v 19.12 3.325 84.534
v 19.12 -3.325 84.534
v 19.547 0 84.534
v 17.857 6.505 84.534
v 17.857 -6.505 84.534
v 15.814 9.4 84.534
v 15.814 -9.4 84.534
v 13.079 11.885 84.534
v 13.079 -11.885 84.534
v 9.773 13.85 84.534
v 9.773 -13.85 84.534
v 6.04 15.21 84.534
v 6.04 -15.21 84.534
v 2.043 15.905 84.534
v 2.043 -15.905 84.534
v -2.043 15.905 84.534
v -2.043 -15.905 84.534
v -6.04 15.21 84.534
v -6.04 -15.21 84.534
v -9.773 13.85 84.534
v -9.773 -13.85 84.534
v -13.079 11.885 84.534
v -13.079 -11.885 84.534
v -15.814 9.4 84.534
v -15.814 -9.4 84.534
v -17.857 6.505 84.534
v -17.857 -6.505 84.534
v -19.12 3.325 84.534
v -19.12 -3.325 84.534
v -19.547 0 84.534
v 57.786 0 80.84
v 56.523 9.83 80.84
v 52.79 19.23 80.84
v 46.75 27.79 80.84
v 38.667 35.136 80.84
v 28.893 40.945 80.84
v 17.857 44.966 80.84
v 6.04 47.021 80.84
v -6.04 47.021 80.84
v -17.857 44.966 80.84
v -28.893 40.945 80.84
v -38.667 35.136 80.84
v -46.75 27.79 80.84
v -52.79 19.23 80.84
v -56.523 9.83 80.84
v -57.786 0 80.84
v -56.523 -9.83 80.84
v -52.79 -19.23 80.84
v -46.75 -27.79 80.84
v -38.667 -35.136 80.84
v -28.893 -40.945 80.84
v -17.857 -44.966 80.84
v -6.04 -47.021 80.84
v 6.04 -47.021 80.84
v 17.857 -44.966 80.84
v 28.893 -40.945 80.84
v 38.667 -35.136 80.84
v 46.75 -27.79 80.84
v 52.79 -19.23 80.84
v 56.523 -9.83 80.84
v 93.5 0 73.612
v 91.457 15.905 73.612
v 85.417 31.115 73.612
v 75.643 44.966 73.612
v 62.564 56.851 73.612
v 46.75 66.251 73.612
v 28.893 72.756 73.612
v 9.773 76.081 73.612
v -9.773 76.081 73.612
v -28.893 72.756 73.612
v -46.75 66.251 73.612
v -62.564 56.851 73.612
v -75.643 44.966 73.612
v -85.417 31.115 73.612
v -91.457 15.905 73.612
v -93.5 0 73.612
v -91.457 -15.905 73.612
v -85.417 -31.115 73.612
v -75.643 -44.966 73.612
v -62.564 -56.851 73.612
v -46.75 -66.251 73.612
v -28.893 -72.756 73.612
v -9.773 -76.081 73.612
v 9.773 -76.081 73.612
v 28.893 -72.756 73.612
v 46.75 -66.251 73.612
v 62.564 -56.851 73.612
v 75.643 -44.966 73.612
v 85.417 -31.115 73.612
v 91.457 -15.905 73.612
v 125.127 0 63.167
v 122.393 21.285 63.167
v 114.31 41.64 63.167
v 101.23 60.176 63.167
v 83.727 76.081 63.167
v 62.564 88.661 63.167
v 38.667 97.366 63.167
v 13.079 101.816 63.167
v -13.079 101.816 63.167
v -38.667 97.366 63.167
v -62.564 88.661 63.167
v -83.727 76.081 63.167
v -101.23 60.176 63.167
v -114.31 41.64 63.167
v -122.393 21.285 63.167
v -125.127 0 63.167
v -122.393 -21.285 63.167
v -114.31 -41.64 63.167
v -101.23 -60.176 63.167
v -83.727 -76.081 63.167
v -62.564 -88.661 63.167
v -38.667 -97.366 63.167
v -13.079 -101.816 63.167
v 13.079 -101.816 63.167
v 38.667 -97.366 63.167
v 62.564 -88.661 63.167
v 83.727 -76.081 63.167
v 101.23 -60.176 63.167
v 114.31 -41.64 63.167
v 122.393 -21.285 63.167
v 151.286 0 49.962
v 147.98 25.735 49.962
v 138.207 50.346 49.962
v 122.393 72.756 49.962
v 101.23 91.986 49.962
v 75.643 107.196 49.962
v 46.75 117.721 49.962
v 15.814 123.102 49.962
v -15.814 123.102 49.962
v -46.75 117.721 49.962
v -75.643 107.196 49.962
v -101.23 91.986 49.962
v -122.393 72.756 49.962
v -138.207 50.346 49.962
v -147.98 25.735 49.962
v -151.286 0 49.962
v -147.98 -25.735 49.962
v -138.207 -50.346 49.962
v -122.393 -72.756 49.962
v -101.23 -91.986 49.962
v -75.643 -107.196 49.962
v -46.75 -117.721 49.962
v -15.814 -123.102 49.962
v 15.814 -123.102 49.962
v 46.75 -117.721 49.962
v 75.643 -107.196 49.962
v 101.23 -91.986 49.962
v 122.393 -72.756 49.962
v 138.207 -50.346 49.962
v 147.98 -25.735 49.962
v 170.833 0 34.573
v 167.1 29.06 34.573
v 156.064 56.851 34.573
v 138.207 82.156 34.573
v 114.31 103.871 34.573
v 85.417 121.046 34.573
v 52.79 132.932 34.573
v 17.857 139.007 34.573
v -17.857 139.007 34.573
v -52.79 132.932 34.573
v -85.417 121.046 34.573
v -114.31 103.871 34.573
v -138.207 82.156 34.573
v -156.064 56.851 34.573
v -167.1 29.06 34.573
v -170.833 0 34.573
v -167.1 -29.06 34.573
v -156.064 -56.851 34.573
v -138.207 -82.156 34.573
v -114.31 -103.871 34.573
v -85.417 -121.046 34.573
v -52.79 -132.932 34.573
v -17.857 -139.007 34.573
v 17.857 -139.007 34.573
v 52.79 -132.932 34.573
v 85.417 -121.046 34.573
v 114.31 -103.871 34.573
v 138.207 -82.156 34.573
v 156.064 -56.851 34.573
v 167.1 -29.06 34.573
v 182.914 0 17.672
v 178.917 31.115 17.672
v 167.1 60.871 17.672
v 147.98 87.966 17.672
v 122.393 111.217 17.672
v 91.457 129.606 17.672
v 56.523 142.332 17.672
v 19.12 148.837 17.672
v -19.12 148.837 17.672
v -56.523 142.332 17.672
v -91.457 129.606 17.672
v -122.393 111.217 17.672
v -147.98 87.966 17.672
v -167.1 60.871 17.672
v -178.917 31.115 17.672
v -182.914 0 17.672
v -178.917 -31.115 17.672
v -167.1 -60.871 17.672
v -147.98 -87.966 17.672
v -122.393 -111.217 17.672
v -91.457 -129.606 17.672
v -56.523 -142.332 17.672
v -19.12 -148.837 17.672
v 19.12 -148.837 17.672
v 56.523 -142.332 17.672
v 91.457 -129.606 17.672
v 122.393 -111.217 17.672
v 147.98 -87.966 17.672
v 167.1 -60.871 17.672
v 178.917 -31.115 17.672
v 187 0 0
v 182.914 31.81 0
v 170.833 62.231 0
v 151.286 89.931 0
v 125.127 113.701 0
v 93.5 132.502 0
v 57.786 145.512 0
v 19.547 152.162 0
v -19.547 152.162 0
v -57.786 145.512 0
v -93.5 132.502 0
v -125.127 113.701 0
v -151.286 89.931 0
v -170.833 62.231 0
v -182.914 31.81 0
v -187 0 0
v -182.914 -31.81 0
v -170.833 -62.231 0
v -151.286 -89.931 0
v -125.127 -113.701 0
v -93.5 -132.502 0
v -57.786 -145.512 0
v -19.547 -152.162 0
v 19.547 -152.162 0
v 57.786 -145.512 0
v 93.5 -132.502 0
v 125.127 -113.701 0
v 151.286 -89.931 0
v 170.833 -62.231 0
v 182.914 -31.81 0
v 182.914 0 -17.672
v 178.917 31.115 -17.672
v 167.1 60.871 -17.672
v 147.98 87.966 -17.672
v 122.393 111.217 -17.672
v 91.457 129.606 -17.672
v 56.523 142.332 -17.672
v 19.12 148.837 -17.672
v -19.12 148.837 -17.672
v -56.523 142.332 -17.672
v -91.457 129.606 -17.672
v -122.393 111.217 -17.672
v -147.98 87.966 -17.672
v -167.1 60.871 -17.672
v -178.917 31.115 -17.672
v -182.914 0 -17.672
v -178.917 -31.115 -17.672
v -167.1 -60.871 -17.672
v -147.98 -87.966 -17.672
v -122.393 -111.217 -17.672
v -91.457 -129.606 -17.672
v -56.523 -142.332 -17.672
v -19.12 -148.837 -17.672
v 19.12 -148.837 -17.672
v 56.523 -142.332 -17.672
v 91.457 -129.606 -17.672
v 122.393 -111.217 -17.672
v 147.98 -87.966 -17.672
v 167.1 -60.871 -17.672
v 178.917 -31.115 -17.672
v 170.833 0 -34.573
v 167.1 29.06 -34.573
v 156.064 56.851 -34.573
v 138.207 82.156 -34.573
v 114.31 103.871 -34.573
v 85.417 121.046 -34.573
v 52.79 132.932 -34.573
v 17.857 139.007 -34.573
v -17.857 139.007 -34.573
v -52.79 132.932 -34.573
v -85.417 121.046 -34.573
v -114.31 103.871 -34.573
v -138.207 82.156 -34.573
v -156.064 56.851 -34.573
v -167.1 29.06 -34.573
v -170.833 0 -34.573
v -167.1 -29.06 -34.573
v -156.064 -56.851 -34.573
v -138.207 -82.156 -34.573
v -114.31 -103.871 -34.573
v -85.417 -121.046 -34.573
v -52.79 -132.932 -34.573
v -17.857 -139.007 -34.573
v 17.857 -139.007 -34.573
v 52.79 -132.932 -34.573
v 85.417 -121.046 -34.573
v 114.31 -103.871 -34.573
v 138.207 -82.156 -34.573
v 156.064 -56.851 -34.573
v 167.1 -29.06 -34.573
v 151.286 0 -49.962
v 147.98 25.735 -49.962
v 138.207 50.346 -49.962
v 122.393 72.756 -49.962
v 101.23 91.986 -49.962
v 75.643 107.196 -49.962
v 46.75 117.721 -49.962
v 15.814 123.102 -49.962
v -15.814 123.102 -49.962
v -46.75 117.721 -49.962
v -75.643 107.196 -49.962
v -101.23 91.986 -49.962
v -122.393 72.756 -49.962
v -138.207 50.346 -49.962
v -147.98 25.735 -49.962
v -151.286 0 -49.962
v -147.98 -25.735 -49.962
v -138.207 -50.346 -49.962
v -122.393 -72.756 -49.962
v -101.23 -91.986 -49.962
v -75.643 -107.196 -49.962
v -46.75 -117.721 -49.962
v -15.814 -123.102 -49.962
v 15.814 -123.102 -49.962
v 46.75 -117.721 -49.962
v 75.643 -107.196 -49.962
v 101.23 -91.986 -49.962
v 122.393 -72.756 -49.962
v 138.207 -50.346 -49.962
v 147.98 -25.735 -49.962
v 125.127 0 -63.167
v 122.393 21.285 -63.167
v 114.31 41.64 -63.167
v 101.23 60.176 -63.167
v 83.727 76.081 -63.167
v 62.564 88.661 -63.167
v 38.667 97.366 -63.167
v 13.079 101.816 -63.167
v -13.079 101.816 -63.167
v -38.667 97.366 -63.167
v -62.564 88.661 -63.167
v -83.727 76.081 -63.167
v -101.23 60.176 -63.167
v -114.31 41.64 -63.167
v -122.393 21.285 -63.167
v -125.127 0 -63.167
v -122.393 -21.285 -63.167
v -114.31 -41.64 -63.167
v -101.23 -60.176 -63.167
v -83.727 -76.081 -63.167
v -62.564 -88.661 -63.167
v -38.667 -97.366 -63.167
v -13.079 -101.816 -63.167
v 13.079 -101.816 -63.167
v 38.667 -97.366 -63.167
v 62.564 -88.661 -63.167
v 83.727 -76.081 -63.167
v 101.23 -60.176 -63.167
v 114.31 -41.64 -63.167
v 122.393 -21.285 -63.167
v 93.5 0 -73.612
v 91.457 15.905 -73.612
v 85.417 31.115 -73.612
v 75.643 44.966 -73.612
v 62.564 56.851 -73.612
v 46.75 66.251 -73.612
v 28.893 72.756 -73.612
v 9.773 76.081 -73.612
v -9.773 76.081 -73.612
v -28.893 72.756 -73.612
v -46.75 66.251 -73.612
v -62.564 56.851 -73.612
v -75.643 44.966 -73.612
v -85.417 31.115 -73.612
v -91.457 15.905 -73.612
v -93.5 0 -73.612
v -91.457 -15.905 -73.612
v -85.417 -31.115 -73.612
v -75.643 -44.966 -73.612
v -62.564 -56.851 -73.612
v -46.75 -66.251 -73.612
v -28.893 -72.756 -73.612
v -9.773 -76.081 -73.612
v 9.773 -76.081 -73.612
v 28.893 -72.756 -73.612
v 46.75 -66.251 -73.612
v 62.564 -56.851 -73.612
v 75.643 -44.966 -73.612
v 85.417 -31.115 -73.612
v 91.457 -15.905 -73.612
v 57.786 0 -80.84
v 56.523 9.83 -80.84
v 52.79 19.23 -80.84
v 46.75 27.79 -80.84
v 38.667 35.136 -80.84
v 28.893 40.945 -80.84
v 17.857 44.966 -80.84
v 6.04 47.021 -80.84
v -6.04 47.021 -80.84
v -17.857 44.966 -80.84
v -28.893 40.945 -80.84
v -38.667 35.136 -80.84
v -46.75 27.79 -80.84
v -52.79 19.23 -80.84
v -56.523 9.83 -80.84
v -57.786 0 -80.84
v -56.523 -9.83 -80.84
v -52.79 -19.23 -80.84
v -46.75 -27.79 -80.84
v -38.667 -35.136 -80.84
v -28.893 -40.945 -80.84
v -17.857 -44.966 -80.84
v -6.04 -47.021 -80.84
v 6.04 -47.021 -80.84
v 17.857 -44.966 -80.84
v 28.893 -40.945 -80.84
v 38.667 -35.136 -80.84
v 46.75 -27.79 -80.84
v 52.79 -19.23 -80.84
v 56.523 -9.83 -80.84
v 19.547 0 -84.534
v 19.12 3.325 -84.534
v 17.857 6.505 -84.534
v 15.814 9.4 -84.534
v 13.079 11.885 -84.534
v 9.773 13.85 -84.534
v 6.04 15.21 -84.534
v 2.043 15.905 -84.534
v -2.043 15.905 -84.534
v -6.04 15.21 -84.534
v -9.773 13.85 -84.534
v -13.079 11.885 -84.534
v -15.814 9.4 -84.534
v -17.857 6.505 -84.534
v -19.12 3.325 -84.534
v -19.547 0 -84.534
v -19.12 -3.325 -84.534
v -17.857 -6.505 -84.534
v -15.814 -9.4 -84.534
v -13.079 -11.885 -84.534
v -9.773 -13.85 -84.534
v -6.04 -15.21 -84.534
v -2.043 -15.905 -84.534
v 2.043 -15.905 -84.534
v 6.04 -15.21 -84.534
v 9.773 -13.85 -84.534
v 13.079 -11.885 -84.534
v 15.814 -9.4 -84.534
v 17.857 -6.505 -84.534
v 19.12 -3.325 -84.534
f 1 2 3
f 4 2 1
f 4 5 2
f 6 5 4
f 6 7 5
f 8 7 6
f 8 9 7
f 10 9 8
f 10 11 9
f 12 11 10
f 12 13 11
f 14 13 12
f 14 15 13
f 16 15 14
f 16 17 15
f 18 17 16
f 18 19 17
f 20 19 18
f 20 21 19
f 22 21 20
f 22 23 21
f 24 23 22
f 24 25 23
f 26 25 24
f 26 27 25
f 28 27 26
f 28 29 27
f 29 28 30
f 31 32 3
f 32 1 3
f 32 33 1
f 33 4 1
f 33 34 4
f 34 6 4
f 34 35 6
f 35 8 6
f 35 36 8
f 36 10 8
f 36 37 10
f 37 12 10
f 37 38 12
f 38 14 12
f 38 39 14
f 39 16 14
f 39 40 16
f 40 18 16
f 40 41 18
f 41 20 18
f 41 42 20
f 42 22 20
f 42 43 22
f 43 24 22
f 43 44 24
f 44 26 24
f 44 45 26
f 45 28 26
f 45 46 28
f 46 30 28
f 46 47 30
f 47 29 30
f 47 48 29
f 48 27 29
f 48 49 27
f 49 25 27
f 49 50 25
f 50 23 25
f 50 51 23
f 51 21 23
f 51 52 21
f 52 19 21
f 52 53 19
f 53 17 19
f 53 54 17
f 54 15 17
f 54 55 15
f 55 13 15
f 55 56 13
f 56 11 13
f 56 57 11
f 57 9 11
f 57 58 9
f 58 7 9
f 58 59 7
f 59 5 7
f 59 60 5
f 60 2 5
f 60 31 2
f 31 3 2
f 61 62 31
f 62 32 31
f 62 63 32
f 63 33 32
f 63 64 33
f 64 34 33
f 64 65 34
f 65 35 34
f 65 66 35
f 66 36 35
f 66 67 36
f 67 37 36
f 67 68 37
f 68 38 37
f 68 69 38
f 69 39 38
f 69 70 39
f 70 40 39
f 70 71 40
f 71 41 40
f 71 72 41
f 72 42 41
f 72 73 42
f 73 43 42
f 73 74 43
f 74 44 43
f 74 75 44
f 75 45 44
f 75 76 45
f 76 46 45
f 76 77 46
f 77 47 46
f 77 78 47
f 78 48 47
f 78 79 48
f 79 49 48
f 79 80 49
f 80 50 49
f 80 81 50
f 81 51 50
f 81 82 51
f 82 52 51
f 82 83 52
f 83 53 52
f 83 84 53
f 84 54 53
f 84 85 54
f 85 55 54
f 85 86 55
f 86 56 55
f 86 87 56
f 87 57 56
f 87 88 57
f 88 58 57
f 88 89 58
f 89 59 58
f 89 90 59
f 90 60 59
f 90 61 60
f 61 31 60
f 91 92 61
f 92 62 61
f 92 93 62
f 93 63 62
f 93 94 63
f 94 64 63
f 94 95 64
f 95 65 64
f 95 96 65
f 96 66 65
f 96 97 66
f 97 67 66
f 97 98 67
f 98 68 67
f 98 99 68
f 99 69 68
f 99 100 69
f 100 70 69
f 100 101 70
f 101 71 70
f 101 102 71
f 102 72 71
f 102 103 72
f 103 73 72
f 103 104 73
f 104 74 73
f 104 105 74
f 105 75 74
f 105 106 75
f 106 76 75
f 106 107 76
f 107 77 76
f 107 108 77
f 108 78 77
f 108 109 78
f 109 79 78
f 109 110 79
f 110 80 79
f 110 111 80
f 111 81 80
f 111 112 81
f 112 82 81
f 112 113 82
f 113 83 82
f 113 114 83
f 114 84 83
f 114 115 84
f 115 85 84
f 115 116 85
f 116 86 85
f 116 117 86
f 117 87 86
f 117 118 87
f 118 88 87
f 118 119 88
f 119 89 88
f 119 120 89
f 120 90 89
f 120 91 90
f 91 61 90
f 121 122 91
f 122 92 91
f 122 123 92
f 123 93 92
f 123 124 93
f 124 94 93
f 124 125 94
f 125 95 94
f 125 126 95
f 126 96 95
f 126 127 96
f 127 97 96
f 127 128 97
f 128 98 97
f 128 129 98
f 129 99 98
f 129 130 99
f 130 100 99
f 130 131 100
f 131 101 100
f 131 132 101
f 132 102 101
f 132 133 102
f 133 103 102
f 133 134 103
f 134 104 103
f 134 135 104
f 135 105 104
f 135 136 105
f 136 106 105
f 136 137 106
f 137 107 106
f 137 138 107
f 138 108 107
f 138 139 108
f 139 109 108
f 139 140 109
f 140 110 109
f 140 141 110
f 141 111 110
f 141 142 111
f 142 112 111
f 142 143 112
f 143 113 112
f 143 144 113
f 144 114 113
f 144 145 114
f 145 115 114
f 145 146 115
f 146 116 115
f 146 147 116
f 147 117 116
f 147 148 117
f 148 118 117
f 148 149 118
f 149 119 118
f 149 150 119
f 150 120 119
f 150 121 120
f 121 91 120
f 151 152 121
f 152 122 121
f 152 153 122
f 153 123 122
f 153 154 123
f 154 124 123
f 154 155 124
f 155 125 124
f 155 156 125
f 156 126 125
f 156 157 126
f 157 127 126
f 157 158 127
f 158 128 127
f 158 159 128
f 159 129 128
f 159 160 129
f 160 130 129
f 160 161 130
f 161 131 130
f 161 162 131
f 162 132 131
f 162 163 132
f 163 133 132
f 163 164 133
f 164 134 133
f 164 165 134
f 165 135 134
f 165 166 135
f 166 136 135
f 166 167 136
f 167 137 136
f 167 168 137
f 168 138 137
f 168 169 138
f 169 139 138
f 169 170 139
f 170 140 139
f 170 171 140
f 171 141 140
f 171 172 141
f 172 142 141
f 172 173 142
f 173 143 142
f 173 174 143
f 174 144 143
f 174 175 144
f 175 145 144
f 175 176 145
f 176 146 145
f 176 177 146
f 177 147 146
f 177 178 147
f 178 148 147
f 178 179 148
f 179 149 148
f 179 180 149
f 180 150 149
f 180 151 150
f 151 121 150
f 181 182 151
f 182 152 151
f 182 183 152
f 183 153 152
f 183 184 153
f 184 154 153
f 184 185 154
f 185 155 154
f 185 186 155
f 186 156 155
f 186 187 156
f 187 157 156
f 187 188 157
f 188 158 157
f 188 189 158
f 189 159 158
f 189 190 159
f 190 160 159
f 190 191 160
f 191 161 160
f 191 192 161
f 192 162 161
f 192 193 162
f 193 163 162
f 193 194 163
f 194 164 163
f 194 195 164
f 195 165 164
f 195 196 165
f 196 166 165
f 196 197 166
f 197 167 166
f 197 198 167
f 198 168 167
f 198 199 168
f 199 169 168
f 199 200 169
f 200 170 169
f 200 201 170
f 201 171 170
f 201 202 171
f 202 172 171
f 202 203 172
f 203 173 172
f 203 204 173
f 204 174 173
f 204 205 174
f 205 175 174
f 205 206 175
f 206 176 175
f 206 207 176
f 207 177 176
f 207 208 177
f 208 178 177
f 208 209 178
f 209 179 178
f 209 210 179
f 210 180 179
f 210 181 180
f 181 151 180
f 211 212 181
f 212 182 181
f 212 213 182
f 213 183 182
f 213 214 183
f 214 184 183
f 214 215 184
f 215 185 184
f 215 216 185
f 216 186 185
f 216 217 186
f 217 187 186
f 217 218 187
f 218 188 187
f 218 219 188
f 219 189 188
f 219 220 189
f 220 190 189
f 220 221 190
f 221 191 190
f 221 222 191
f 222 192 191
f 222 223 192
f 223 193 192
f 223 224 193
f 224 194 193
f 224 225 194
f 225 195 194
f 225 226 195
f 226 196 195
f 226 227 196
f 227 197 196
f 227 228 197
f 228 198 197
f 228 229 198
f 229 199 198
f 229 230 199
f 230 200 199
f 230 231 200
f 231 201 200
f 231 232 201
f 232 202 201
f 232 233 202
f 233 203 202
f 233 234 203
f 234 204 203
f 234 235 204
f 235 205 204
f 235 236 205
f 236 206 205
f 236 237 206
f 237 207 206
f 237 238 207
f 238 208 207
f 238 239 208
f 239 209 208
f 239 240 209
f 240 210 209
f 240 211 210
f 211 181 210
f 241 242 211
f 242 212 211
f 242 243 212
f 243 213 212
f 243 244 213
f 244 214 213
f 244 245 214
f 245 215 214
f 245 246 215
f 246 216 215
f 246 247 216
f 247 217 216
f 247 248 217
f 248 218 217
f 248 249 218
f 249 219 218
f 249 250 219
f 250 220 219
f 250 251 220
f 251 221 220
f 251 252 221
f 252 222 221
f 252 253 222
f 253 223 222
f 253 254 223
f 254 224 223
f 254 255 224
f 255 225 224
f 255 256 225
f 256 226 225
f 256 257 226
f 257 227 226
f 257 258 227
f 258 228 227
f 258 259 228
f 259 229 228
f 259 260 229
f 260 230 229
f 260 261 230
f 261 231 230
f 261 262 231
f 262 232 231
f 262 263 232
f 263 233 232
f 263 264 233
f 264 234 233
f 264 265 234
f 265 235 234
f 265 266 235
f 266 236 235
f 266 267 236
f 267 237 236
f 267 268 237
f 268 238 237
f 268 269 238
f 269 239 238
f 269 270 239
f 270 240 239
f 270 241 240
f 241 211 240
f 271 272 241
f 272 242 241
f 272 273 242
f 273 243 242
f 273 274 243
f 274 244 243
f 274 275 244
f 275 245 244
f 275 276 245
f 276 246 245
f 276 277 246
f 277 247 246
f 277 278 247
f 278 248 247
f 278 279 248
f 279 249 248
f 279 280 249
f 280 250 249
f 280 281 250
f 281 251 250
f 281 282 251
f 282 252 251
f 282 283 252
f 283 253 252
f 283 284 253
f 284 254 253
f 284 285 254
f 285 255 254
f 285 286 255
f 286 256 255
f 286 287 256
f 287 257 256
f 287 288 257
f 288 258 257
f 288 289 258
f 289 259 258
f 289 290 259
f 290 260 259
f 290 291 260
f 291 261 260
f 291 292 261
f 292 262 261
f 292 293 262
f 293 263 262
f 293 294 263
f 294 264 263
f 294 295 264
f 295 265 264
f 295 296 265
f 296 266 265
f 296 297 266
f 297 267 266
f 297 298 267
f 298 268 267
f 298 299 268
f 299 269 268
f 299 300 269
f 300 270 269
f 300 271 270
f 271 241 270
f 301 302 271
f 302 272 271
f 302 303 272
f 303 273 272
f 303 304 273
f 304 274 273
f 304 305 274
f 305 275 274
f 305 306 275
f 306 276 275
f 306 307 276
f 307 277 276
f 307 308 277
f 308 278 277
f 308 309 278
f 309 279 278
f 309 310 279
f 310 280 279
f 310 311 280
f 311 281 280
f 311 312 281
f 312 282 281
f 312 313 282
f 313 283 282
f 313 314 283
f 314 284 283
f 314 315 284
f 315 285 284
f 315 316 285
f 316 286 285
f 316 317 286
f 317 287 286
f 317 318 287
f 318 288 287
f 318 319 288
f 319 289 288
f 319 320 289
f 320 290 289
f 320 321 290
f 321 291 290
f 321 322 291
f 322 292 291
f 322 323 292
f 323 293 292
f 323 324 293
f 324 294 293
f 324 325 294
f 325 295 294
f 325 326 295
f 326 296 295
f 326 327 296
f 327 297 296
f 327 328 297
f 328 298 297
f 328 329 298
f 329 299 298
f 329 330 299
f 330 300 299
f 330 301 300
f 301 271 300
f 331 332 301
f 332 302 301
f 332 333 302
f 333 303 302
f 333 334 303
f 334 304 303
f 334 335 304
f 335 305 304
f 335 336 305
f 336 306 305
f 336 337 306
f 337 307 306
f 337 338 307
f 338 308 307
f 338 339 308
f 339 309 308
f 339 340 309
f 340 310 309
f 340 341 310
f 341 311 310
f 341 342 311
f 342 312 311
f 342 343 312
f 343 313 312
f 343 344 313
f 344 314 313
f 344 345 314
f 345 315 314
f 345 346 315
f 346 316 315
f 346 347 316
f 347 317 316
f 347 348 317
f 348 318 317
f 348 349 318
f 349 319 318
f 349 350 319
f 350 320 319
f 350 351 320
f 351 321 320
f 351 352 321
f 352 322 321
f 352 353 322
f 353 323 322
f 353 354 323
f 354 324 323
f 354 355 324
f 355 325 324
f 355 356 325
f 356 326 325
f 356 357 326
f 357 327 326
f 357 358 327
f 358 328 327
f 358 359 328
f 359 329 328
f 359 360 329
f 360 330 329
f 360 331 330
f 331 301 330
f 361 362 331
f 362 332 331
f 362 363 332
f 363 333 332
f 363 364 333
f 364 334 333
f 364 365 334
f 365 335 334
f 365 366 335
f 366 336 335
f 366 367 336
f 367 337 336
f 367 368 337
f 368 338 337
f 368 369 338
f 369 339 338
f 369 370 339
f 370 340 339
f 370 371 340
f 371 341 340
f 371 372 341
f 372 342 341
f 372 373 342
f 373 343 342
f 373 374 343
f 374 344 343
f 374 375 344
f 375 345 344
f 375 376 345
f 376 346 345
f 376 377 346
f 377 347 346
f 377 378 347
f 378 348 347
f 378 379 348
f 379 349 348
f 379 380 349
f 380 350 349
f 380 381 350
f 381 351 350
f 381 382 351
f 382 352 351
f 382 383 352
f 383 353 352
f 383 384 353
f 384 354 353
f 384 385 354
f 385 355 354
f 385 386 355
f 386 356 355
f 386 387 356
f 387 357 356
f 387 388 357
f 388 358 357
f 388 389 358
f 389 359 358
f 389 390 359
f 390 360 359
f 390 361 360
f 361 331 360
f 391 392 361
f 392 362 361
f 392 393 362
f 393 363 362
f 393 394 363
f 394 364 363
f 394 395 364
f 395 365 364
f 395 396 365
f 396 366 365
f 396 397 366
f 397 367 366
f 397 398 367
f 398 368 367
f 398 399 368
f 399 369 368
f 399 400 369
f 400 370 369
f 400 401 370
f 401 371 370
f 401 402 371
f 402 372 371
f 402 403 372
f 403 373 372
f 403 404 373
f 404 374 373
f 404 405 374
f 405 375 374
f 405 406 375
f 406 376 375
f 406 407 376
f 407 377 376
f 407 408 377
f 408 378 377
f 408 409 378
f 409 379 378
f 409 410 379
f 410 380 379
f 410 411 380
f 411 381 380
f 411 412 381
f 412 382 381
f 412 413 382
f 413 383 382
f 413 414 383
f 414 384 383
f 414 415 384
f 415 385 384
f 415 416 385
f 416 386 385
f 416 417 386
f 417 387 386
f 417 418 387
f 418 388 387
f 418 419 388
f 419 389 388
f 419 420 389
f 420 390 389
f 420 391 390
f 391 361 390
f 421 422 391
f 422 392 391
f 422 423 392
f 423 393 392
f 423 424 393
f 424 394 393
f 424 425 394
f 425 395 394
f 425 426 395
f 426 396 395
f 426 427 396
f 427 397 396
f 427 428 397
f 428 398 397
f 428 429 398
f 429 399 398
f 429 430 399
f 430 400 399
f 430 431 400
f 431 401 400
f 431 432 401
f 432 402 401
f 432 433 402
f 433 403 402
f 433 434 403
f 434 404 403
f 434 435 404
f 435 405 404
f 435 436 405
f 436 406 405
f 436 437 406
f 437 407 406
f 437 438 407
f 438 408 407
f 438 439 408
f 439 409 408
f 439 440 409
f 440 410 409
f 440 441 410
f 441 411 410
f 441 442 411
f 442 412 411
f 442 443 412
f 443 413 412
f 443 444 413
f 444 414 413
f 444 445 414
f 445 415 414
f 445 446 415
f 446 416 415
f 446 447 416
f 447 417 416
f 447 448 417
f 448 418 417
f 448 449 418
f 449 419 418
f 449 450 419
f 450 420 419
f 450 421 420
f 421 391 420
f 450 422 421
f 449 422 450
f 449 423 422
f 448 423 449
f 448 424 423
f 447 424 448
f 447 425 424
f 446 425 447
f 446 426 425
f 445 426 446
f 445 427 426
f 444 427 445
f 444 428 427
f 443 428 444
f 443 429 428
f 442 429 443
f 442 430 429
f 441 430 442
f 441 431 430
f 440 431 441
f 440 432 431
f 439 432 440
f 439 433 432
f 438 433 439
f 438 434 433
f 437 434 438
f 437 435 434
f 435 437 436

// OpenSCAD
// Generated by SolidPython 1.0.1 on 2020-07-29 00:46:49


scale(v = [11, 9, 5]) {
	sphere(r = 17);
}
/***********************************************
*********      SolidPython code:      **********
************************************************
 
# import packages: SolidPython
from solid import *
from solid.utils import *
from itertools import chain, combinations, permutations


class Resize:

    def __init__(self, scad_file):
        self.scad_file = scad_file
        #self.scad_file = import_scad(scad_file)
        # cone/cylinder param:
        self.r1 = 0
        self.r2 = 0
        self.h = 0
        # rectangular prism param:
        self.w = 0
        self.l = 0
        # ellipse param:
        self.r = 0

    # import OpenScad code (file name corresponds to shape)


    # classify shape + parameters
    def assign(self, param1, param2, param3):
        if self.scad_file == 'cone.scad':
            self.r1 = param1
            self.r2 = param2
            self.h = param3
        elif self.scad_file == 'cylinder.scad':
            self.r1 = param1
            self.r2 = param2
            self.h = param3
        elif self.scad_file == 'rectangularPrism.scad':
            self.h = param1
            self.l = param2
            self.w = param3
        else:
            self.r = param1
            self.h = param2

    # resize parameters
    def iterate(self):
        x = range(3, 20, 2)
        i = 1
        if self.scad_file == 'cone.scad':
            tempList = list(permutations(x, 2))
            for temp in tempList:
                param1 = temp[0]
                param2 = temp[1]
                filepath = 'produced_scad_files/' + 'cone' + str(param1) + '_' + str(param2) + '_' + '.scad'
                scad_render_to_file(cylinder(h=param1, r1=param2, r2=0), filepath)

        elif self.scad_file == 'cylinder.scad':
            tempList = list(permutations(x, 3))
            for temp in tempList:
                param1 = temp[0]
                param2 = temp[1]
                filepath = 'produced_scad_files/' + 'cylinder' + str(param1) + '_' + str(param2) + '_' + '.scad'
                scad_render_to_file(cylinder(h=param1, r1=param2, r2=param2), filepath)

        elif self.scad_file == 'rectangularPrism.scad':
            tempList = list(permutations(x, 3))
            for temp in tempList:
                param1 = temp[0]
                param2 = temp[1]
                param3 = temp[2]
                filepath = 'produced_scad_files/' + 'rectangularPrism' + str(param1) + '_' + str(param2) + '_' + str(
                    param3) + '.scad'
                scad_render_to_file(cube(size=(param1, param2, param3)), filepath)

        elif self.scad_file == 'ellipse.scad':
            tempList = list(permutations(x, 4))
            for temp in tempList:
                param1 = temp[0]
                param2 = temp[1]
                param3 = temp[2]
                param4 = temp[3]
                filepath = 'produced_scad_files/' + 'ellipse' + str(param1) + '_' + str(param2) + '_' + str(param3) + '_' + str(param4) + '.scad'
                scad_render_to_file(scale([param1, param2, param3])(sphere(r=param4)), filepath)

    def render_to_scadfile(self):
        scad_render_to_file(scad, 'example.scad') 
 
************************************************/
